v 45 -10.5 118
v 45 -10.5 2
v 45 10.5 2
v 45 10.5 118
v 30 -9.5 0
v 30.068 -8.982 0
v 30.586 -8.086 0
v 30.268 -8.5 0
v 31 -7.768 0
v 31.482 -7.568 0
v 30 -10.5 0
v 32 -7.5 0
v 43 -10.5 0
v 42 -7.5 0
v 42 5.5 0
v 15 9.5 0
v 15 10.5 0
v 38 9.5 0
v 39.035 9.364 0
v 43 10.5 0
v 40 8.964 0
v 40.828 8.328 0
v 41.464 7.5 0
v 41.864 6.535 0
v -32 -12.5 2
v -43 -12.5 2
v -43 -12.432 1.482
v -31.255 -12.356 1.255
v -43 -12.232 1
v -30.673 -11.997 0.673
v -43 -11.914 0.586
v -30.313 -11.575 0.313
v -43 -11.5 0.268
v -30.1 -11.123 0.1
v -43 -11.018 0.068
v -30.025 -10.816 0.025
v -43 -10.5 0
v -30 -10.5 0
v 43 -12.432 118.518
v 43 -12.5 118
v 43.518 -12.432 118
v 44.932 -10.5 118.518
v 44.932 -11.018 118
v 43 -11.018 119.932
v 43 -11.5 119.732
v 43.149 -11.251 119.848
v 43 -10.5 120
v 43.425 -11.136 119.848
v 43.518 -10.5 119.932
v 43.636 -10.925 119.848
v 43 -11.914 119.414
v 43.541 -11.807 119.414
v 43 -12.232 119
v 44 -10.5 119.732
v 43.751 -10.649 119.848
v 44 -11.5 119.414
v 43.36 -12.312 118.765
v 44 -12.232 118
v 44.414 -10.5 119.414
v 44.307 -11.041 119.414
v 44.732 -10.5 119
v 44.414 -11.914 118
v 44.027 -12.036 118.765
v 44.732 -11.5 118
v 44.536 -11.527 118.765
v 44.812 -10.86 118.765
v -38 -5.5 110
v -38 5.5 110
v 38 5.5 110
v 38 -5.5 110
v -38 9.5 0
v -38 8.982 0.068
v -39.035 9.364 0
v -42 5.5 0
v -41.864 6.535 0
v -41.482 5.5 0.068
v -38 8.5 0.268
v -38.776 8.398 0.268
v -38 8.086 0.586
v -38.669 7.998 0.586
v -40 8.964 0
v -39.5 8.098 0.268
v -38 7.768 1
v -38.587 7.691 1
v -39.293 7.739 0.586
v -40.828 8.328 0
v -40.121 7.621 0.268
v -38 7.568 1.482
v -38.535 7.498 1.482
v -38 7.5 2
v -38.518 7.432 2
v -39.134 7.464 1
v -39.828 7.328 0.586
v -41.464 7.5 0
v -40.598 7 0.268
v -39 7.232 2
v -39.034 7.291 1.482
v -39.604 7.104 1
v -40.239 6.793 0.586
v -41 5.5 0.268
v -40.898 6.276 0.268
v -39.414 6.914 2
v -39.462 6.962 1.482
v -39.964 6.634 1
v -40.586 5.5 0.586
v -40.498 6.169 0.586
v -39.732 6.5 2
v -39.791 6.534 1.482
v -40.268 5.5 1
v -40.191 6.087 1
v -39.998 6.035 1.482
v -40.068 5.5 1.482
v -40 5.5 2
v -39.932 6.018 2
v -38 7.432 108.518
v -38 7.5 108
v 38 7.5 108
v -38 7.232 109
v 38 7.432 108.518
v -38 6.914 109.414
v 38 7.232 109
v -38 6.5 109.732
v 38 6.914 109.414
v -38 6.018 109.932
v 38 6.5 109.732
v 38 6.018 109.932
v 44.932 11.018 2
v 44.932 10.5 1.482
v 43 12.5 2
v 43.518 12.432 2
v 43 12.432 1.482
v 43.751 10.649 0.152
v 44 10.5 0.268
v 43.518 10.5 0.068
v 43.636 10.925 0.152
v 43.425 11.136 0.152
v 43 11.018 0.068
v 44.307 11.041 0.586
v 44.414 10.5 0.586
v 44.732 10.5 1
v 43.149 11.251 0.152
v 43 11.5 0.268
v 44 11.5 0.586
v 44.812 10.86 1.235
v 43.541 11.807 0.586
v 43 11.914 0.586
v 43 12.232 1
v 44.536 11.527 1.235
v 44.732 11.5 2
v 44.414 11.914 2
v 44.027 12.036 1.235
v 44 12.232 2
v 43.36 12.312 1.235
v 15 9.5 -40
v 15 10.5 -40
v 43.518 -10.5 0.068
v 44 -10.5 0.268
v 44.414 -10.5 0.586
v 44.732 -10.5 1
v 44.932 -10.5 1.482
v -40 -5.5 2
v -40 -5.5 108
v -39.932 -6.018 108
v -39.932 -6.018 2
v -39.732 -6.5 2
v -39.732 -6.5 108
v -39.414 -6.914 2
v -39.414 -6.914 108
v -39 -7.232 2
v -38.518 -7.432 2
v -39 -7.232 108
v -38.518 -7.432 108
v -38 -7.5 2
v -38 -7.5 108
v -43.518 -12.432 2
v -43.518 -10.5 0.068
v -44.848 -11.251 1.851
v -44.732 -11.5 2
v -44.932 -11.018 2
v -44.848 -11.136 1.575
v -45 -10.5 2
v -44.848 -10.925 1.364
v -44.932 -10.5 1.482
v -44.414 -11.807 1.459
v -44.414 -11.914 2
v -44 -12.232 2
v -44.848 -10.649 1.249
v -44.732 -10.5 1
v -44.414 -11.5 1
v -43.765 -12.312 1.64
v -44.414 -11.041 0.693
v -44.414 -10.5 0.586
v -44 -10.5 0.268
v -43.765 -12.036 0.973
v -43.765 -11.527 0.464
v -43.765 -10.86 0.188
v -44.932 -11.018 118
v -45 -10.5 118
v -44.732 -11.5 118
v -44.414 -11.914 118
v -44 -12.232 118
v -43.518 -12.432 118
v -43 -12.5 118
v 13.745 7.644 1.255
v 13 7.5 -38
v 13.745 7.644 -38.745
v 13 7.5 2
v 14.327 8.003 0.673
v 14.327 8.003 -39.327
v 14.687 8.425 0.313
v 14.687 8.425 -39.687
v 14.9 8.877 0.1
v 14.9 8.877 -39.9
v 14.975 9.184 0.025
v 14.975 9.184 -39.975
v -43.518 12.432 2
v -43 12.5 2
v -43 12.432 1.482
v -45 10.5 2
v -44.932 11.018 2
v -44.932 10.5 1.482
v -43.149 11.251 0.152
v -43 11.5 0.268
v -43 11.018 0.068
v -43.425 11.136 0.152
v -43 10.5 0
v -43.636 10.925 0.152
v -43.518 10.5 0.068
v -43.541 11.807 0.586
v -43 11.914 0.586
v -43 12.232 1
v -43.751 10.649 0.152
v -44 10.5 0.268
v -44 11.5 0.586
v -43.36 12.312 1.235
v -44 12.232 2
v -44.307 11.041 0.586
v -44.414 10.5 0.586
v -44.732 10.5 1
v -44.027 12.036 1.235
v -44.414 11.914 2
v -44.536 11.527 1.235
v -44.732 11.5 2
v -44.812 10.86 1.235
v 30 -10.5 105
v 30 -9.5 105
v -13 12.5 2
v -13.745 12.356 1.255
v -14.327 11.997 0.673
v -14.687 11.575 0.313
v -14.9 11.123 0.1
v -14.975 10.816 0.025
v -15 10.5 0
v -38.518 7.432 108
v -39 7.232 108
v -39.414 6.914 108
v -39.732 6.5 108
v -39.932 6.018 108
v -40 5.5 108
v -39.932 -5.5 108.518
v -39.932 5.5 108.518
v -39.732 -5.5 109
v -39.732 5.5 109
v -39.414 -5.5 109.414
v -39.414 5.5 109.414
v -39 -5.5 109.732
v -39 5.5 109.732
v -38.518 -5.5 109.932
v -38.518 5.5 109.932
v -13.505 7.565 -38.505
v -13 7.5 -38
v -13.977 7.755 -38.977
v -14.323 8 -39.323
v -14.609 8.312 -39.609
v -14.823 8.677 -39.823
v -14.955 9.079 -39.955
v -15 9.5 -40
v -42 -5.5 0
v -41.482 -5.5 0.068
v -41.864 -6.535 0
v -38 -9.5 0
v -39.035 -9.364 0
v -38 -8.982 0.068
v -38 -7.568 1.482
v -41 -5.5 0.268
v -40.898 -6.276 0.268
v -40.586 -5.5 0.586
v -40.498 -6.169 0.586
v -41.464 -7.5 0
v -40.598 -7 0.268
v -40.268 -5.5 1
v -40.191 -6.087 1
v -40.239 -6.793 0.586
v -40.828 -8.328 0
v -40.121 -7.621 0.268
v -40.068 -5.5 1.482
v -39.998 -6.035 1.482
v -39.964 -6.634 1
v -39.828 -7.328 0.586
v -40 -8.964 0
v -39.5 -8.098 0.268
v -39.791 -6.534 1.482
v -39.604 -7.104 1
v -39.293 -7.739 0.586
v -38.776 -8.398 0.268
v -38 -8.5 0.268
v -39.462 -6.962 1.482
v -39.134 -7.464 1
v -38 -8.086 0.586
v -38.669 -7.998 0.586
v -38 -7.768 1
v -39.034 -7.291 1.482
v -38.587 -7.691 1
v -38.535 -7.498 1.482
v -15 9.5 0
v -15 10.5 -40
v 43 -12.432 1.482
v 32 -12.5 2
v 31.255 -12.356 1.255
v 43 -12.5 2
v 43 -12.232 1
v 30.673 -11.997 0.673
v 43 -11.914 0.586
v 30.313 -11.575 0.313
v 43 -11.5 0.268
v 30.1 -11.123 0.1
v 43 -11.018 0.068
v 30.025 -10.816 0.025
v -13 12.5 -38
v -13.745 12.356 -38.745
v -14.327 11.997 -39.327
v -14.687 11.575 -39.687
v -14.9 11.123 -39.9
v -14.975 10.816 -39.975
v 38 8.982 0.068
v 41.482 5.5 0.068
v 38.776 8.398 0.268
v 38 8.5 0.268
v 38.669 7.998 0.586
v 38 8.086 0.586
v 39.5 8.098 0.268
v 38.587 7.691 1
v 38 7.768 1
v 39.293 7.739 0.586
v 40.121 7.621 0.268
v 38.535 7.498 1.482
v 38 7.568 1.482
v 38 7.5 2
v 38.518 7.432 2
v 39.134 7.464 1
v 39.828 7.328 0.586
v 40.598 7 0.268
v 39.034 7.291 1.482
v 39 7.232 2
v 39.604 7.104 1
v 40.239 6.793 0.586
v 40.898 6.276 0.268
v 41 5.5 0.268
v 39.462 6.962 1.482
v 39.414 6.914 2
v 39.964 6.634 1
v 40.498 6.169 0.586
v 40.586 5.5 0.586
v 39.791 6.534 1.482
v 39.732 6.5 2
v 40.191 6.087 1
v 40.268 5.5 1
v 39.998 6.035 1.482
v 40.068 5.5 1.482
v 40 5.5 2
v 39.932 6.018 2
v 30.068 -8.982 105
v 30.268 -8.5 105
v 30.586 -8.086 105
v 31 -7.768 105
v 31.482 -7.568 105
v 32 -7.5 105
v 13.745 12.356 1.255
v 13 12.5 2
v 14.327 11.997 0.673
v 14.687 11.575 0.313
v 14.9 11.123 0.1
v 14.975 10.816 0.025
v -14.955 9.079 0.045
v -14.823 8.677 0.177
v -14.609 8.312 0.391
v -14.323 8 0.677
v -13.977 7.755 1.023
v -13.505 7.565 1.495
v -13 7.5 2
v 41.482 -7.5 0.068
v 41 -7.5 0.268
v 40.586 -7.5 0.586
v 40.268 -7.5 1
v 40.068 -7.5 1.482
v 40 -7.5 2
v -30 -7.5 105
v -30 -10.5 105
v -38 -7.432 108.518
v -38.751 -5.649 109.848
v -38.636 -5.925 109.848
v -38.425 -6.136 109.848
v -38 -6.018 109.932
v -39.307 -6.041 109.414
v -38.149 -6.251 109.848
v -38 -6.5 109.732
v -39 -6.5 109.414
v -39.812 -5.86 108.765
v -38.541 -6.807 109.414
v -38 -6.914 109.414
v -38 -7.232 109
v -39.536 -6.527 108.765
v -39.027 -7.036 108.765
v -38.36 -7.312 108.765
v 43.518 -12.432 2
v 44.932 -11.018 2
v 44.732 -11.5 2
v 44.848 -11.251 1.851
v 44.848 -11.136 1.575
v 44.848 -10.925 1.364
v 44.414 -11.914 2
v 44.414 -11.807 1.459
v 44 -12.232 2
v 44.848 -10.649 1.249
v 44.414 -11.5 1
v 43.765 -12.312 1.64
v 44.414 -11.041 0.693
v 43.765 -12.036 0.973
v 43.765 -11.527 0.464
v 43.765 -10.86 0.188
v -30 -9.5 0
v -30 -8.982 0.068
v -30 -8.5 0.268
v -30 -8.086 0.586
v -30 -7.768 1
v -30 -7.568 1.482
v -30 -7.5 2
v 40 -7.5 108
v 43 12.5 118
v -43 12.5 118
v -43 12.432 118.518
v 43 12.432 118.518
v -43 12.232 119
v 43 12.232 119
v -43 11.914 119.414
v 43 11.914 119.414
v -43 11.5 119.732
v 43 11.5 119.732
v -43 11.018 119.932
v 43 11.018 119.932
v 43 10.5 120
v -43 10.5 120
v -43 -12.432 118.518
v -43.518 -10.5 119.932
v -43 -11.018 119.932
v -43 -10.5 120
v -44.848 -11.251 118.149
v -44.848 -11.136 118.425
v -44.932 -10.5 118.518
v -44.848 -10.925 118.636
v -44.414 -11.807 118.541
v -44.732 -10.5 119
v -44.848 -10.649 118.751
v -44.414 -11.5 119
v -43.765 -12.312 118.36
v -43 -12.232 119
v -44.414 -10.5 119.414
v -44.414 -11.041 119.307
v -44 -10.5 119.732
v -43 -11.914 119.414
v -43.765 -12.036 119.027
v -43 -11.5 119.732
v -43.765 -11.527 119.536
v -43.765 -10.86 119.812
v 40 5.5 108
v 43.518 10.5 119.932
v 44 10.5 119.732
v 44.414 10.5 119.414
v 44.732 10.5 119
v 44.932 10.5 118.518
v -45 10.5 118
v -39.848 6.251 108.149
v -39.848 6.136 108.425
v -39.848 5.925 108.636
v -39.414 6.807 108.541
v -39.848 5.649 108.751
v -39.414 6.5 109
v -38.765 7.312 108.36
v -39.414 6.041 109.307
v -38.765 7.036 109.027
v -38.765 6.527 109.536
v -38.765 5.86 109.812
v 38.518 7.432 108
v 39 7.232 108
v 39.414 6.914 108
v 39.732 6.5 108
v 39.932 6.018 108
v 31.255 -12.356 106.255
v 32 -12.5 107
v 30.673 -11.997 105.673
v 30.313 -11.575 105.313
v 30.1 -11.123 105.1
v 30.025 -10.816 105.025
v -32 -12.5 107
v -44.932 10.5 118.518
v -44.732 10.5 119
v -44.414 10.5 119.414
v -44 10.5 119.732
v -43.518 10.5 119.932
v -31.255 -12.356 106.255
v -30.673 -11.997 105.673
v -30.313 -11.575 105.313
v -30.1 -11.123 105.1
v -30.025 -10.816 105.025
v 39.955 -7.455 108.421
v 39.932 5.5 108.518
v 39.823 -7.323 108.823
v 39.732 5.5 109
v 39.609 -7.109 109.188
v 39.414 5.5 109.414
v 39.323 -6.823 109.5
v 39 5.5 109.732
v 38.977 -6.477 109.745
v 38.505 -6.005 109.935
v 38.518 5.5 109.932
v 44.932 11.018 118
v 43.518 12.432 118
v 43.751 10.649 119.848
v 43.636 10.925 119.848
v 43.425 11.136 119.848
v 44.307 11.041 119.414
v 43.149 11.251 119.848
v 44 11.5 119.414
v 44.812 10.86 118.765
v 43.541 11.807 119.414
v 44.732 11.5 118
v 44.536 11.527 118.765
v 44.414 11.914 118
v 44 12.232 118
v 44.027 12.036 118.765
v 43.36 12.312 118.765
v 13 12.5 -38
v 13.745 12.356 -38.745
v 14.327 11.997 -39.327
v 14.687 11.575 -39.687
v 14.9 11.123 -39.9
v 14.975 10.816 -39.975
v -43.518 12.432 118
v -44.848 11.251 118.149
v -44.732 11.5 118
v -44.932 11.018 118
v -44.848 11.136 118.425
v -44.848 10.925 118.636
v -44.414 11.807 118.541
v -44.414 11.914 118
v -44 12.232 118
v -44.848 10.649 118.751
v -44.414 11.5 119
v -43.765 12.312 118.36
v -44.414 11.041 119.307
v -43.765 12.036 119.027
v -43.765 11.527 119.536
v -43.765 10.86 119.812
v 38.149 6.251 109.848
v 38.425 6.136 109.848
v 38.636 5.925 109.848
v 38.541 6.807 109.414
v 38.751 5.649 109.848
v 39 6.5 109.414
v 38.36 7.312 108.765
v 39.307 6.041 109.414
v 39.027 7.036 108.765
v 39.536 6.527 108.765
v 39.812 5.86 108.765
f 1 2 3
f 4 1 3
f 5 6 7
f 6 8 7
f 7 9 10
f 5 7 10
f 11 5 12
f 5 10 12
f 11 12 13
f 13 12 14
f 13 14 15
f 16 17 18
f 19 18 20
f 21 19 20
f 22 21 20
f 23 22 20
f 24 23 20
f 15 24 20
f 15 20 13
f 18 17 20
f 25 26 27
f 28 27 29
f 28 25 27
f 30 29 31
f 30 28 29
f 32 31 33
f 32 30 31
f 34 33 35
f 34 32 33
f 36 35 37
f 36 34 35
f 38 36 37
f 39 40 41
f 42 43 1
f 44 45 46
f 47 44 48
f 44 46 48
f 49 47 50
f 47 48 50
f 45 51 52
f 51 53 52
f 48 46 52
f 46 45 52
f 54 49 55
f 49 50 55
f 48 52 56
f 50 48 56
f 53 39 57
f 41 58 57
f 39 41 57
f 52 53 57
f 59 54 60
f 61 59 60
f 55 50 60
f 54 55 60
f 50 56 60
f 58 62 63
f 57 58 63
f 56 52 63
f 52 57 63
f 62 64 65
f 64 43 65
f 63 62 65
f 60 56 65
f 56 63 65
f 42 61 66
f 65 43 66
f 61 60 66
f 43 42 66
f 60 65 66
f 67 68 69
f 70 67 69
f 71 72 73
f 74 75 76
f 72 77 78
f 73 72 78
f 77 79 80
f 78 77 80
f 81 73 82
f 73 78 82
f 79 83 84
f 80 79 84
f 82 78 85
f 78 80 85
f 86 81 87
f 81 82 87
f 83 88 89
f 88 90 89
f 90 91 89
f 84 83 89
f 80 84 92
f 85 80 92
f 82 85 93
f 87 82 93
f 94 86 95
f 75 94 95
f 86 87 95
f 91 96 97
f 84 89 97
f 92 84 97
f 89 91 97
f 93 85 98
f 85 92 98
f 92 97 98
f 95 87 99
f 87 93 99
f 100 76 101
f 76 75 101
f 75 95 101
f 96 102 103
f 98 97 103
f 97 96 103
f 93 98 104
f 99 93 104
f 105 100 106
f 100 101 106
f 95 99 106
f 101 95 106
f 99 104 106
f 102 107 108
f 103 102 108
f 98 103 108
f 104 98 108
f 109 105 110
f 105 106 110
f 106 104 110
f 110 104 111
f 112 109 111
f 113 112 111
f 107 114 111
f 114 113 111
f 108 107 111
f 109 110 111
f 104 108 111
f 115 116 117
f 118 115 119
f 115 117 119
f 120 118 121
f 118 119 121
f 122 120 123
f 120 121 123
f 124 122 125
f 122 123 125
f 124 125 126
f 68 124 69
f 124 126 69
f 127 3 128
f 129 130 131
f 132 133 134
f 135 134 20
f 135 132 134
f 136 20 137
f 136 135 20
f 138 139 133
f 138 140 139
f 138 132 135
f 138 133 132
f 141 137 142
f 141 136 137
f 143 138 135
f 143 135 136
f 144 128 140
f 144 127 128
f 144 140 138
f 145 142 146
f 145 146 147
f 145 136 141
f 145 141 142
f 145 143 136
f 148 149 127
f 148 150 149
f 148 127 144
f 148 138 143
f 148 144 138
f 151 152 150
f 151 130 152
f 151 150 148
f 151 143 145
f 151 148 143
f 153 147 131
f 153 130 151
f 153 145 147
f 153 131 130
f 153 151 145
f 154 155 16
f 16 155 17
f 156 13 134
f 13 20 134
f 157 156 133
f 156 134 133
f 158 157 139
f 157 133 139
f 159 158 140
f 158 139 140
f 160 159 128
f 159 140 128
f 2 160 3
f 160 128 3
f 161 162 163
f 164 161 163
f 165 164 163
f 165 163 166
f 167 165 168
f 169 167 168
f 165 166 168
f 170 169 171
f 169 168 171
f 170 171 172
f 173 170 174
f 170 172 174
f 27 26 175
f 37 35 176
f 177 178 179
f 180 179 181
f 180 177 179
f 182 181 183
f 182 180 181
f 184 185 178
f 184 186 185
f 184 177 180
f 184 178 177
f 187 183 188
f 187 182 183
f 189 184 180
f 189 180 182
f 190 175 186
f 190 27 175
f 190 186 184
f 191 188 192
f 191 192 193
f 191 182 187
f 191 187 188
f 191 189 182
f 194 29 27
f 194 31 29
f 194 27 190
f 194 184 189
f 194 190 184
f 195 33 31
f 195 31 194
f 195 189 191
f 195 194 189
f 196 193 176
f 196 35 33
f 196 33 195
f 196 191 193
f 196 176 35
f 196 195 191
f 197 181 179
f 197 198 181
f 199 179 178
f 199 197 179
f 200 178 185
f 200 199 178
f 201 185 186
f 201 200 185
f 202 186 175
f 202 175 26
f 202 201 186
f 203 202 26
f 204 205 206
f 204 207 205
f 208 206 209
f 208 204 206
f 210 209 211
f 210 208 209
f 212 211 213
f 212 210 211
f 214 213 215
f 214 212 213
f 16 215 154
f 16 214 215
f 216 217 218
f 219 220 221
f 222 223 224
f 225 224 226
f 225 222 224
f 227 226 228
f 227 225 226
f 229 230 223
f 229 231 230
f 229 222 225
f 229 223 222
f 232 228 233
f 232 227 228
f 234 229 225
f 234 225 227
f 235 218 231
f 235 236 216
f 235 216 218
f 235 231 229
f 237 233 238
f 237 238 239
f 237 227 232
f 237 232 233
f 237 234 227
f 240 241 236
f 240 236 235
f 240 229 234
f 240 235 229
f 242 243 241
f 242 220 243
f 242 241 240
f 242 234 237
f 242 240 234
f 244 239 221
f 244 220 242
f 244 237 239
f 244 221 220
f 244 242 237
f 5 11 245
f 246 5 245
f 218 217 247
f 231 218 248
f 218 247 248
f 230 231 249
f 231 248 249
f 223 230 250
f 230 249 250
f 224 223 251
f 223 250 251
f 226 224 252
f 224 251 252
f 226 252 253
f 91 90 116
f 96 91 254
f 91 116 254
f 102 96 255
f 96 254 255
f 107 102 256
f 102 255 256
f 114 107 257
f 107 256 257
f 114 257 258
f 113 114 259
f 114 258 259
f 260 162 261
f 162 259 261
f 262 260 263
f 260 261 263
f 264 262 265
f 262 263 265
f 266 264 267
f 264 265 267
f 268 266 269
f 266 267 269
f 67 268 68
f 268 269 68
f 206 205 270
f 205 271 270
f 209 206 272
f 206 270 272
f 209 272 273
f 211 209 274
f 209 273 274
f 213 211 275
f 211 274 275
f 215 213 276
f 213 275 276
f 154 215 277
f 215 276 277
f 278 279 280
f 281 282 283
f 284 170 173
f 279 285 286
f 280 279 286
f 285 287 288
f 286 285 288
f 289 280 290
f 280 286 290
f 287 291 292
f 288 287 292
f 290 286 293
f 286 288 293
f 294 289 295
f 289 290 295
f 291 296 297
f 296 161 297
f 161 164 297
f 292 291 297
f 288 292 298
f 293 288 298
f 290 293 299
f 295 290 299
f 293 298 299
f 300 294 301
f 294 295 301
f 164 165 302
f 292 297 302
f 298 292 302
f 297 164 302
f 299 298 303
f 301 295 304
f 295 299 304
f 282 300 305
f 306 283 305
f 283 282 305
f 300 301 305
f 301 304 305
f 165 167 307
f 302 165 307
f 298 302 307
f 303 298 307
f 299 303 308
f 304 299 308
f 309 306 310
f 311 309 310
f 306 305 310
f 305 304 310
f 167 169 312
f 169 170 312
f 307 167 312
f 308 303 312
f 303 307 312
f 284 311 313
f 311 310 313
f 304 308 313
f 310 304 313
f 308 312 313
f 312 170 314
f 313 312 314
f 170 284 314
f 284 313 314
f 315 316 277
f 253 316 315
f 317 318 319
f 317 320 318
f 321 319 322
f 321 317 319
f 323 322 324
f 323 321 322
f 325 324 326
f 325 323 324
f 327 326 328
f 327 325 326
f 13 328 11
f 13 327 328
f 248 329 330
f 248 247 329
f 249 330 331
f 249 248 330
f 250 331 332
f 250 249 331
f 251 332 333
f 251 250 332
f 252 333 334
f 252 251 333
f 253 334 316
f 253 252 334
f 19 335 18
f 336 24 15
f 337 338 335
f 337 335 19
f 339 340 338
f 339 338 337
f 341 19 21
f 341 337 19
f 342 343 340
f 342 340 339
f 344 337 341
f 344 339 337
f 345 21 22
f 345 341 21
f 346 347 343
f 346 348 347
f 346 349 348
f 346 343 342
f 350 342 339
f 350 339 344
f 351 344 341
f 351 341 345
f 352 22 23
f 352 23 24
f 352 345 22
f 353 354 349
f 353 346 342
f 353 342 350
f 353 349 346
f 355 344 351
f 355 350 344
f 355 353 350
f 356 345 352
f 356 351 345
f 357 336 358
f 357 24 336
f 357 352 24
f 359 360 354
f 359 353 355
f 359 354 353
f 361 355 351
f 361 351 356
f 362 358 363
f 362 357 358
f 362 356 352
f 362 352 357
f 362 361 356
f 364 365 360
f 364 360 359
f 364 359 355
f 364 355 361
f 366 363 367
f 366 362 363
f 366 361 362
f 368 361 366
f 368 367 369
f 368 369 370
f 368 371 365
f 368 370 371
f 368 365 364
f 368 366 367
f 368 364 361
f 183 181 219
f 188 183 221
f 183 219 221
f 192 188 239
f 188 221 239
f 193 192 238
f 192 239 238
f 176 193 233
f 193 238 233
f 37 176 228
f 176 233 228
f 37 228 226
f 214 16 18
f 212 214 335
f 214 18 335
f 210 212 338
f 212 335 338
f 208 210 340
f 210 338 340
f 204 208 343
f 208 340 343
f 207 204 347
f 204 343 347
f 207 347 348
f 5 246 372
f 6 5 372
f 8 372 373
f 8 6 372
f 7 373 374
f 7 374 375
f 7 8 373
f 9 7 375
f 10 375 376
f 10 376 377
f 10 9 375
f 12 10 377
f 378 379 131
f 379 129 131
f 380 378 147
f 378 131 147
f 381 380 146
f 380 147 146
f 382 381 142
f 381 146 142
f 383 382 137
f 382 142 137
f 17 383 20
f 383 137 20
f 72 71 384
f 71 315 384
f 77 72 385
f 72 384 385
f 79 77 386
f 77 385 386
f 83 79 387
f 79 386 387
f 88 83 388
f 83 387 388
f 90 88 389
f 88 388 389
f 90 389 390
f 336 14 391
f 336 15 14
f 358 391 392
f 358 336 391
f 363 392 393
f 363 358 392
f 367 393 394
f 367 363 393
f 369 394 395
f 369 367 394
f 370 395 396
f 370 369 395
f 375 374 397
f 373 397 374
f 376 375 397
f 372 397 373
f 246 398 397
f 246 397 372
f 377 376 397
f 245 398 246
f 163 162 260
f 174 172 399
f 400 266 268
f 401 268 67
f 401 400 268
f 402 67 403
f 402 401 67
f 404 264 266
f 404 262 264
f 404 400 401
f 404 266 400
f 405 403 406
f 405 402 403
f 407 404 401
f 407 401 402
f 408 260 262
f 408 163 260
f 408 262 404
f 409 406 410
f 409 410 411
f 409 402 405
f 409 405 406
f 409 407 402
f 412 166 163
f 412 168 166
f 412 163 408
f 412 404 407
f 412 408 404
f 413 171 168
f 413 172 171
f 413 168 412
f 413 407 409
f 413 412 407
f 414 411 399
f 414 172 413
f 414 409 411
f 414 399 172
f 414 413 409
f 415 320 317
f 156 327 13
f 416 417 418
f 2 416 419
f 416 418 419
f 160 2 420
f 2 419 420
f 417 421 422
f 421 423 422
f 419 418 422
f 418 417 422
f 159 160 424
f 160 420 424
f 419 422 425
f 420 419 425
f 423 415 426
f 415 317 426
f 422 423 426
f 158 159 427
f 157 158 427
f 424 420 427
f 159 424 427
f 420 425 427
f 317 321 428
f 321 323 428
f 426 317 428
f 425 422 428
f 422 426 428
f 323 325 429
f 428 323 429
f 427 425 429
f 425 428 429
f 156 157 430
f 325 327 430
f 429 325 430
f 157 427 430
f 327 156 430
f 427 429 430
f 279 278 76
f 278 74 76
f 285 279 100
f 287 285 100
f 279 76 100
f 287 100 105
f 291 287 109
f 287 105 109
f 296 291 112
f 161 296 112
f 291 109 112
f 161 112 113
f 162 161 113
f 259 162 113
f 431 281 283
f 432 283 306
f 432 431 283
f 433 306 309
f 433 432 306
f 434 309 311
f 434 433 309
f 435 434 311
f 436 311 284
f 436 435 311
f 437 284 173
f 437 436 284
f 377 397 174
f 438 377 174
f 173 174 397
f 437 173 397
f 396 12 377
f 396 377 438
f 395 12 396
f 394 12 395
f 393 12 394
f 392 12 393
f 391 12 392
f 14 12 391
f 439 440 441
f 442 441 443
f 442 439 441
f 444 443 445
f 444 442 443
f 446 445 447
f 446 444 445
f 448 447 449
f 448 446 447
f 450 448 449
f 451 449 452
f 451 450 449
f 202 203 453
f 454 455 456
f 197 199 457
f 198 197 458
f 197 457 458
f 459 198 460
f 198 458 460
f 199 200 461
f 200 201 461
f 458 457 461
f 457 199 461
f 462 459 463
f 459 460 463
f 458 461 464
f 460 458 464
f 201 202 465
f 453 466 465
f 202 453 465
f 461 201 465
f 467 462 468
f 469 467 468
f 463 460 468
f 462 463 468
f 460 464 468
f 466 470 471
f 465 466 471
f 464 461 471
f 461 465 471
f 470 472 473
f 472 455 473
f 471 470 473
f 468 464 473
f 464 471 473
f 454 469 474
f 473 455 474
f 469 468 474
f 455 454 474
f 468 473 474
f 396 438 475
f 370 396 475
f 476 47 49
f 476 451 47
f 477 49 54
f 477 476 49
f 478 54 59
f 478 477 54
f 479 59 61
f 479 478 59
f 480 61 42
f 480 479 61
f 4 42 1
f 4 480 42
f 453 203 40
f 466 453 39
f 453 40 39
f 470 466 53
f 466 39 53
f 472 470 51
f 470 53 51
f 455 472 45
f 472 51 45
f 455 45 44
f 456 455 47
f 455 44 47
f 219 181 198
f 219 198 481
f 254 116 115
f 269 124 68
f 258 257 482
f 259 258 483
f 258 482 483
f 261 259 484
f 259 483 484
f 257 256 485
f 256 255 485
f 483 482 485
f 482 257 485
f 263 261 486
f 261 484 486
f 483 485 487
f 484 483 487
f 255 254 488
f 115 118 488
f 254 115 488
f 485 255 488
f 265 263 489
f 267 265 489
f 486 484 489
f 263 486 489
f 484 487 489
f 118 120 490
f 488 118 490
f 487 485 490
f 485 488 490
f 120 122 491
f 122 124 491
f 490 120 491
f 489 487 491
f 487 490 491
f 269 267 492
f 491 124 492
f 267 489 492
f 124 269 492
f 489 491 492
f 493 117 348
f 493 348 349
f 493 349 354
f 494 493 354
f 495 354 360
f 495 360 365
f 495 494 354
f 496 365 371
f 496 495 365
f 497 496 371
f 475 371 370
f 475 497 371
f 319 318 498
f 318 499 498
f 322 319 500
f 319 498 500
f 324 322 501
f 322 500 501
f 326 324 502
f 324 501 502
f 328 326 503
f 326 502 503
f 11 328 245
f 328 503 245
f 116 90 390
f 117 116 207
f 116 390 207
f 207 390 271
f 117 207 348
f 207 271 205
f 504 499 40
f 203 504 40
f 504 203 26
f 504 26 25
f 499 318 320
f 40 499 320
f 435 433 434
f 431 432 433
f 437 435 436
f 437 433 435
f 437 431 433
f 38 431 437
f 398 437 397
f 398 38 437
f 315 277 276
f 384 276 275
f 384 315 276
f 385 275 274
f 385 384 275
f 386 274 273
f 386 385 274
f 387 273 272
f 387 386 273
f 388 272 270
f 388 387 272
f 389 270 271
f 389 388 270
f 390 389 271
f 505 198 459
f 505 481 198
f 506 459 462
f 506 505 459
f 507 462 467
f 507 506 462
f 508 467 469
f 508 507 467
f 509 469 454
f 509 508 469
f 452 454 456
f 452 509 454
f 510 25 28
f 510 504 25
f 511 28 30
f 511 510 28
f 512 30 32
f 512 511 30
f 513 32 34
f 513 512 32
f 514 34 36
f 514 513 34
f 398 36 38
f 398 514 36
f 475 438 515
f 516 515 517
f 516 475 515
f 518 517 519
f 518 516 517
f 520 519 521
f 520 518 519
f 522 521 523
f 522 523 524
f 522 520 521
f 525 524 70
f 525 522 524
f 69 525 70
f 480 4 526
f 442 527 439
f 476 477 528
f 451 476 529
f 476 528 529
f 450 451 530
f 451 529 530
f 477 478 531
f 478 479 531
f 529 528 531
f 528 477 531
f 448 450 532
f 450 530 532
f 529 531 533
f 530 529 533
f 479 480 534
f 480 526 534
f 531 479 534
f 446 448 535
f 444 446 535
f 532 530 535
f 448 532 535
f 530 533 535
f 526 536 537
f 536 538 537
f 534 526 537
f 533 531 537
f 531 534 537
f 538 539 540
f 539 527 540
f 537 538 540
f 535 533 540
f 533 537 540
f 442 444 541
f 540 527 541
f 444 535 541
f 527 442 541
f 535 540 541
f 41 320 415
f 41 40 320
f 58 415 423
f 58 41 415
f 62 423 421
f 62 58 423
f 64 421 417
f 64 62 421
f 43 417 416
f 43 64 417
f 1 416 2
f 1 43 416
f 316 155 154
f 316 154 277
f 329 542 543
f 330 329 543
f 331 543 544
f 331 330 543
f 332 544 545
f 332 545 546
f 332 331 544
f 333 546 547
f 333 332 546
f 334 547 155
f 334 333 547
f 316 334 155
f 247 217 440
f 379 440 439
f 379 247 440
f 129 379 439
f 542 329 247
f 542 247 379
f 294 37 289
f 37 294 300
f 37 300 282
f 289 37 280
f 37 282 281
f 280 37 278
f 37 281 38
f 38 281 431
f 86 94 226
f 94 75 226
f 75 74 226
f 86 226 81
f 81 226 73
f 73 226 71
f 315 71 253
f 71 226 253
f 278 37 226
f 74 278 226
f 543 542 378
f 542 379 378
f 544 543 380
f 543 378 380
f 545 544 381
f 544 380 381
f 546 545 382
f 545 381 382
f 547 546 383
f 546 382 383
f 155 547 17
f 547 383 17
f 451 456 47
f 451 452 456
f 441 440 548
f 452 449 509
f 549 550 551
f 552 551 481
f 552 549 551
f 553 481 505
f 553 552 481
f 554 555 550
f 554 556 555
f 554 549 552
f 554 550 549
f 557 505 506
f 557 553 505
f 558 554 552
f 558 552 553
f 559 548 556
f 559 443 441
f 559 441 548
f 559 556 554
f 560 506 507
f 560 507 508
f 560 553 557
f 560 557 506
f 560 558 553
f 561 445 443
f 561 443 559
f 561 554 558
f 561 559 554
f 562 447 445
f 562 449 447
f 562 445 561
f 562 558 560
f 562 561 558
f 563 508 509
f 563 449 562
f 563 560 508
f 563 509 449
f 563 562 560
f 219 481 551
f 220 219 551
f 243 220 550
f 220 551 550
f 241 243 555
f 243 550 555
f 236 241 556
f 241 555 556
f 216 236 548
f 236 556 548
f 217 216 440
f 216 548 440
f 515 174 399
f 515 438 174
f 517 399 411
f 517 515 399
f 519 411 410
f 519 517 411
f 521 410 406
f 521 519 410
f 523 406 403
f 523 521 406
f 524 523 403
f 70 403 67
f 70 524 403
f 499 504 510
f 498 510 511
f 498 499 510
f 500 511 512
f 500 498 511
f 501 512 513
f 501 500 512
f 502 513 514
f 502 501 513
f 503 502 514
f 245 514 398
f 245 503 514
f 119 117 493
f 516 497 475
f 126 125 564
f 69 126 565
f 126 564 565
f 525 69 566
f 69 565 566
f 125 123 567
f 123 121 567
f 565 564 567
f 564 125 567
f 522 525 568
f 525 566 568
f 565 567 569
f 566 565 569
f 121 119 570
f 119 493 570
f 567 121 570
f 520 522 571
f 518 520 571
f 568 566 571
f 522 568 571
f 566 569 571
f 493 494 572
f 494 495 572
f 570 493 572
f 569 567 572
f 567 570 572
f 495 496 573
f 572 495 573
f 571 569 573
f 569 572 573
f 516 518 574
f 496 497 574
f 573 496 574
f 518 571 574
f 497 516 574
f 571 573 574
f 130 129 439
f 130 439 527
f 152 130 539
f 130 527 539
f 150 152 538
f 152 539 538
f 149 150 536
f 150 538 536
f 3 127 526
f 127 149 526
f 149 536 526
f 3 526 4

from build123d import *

# Parameters (mm, degrees)
F0_W     = 90
F0_H     = 25
F0_W_2   = 80
F0_H_2   = 15
F1_DEPTH = 120
F3_DEPTH = 110
F2_W     = 60
F2_H     = 105
F4_DEPTH = 10
F5_W     = 30
F5_H     = 40
F6_DEPTH = 5
F7_R     = 2


with BuildPart() as f1:
    # F0 (on Top) → F1 (new body)
    with BuildSketch(Plane.XY):
        Rectangle(F0_W, F0_H)
        Rectangle(F0_W_2, F0_H_2, mode=Mode.SUBTRACT)
        Rectangle(F0_W_2, F0_H_2)
    extrude(amount=F1_DEPTH)

    # F0 (on Top) → F3 (cut)
    with BuildSketch(Plane.XY):
        Rectangle(F0_W_2, F0_H_2)
    extrude(amount=F3_DEPTH, mode=Mode.SUBTRACT)

    # F2 (on face) → F4 (cut)
    with BuildSketch(Plane.XZ.offset(12.5)):
        with Locations((0, 52.5)):
            Rectangle(F2_W, F2_H)
    extrude(amount=-F4_DEPTH, mode=Mode.SUBTRACT)

    # F5 (on face) → F6 (join)
    with BuildSketch(Plane(origin=(0, 12.5, 0), x_dir=(-1, 0, 0), z_dir=(0, 1, 0))):
        with Locations((0, -20)):
            Rectangle(F5_W, F5_H)
    extrude(amount=-F6_DEPTH)

    # F7
    f7_edges = [f1.edges().sort_by_distance(p)[0] for p in [
        (40, 7.5, 55),
        (0, 7.5, 110),
        (-40, 7.5, 55),
        (-27.5, 7.5, 0),
        (-15, 7.5, -20),
        (0, 7.5, -40),
        (15, 7.5, -20),
        (27.5, 7.5, 0),
        (30, -7.5, 52.5),
        (-40, -7.5, 55),
        (-40, 0, 110),
        (0, -7.5, 110),
        (40, 0, 110),
        (-37.5, -12.5, 0),
        (-30, -12.5, 52.5),
        (0, -12.5, 105),
        (30, -12.5, 52.5),
        (37.5, -12.5, 0),
        (45, -12.5, 60),
        (0, -12.5, 120),
        (-45, -12.5, 60),
        (45, 12.5, 60),
        (45, 0, 0),
        (45, 0, 120),
        (0, 12.5, 120),
        (-45, 12.5, 60),
        (-30, 12.5, 0),
        (-15, 12.5, -20),
        (0, 12.5, -40),
        (15, 12.5, -20),
        (30, 12.5, 0),
        (-45, 0, 0),
        (-45, 0, 120),
        (-40, 0, 0),
        (-35, -7.5, 0),
        (40, 0, 0),
    ]]
    fillet(f7_edges, radius=F7_R)


solid = f1.part
